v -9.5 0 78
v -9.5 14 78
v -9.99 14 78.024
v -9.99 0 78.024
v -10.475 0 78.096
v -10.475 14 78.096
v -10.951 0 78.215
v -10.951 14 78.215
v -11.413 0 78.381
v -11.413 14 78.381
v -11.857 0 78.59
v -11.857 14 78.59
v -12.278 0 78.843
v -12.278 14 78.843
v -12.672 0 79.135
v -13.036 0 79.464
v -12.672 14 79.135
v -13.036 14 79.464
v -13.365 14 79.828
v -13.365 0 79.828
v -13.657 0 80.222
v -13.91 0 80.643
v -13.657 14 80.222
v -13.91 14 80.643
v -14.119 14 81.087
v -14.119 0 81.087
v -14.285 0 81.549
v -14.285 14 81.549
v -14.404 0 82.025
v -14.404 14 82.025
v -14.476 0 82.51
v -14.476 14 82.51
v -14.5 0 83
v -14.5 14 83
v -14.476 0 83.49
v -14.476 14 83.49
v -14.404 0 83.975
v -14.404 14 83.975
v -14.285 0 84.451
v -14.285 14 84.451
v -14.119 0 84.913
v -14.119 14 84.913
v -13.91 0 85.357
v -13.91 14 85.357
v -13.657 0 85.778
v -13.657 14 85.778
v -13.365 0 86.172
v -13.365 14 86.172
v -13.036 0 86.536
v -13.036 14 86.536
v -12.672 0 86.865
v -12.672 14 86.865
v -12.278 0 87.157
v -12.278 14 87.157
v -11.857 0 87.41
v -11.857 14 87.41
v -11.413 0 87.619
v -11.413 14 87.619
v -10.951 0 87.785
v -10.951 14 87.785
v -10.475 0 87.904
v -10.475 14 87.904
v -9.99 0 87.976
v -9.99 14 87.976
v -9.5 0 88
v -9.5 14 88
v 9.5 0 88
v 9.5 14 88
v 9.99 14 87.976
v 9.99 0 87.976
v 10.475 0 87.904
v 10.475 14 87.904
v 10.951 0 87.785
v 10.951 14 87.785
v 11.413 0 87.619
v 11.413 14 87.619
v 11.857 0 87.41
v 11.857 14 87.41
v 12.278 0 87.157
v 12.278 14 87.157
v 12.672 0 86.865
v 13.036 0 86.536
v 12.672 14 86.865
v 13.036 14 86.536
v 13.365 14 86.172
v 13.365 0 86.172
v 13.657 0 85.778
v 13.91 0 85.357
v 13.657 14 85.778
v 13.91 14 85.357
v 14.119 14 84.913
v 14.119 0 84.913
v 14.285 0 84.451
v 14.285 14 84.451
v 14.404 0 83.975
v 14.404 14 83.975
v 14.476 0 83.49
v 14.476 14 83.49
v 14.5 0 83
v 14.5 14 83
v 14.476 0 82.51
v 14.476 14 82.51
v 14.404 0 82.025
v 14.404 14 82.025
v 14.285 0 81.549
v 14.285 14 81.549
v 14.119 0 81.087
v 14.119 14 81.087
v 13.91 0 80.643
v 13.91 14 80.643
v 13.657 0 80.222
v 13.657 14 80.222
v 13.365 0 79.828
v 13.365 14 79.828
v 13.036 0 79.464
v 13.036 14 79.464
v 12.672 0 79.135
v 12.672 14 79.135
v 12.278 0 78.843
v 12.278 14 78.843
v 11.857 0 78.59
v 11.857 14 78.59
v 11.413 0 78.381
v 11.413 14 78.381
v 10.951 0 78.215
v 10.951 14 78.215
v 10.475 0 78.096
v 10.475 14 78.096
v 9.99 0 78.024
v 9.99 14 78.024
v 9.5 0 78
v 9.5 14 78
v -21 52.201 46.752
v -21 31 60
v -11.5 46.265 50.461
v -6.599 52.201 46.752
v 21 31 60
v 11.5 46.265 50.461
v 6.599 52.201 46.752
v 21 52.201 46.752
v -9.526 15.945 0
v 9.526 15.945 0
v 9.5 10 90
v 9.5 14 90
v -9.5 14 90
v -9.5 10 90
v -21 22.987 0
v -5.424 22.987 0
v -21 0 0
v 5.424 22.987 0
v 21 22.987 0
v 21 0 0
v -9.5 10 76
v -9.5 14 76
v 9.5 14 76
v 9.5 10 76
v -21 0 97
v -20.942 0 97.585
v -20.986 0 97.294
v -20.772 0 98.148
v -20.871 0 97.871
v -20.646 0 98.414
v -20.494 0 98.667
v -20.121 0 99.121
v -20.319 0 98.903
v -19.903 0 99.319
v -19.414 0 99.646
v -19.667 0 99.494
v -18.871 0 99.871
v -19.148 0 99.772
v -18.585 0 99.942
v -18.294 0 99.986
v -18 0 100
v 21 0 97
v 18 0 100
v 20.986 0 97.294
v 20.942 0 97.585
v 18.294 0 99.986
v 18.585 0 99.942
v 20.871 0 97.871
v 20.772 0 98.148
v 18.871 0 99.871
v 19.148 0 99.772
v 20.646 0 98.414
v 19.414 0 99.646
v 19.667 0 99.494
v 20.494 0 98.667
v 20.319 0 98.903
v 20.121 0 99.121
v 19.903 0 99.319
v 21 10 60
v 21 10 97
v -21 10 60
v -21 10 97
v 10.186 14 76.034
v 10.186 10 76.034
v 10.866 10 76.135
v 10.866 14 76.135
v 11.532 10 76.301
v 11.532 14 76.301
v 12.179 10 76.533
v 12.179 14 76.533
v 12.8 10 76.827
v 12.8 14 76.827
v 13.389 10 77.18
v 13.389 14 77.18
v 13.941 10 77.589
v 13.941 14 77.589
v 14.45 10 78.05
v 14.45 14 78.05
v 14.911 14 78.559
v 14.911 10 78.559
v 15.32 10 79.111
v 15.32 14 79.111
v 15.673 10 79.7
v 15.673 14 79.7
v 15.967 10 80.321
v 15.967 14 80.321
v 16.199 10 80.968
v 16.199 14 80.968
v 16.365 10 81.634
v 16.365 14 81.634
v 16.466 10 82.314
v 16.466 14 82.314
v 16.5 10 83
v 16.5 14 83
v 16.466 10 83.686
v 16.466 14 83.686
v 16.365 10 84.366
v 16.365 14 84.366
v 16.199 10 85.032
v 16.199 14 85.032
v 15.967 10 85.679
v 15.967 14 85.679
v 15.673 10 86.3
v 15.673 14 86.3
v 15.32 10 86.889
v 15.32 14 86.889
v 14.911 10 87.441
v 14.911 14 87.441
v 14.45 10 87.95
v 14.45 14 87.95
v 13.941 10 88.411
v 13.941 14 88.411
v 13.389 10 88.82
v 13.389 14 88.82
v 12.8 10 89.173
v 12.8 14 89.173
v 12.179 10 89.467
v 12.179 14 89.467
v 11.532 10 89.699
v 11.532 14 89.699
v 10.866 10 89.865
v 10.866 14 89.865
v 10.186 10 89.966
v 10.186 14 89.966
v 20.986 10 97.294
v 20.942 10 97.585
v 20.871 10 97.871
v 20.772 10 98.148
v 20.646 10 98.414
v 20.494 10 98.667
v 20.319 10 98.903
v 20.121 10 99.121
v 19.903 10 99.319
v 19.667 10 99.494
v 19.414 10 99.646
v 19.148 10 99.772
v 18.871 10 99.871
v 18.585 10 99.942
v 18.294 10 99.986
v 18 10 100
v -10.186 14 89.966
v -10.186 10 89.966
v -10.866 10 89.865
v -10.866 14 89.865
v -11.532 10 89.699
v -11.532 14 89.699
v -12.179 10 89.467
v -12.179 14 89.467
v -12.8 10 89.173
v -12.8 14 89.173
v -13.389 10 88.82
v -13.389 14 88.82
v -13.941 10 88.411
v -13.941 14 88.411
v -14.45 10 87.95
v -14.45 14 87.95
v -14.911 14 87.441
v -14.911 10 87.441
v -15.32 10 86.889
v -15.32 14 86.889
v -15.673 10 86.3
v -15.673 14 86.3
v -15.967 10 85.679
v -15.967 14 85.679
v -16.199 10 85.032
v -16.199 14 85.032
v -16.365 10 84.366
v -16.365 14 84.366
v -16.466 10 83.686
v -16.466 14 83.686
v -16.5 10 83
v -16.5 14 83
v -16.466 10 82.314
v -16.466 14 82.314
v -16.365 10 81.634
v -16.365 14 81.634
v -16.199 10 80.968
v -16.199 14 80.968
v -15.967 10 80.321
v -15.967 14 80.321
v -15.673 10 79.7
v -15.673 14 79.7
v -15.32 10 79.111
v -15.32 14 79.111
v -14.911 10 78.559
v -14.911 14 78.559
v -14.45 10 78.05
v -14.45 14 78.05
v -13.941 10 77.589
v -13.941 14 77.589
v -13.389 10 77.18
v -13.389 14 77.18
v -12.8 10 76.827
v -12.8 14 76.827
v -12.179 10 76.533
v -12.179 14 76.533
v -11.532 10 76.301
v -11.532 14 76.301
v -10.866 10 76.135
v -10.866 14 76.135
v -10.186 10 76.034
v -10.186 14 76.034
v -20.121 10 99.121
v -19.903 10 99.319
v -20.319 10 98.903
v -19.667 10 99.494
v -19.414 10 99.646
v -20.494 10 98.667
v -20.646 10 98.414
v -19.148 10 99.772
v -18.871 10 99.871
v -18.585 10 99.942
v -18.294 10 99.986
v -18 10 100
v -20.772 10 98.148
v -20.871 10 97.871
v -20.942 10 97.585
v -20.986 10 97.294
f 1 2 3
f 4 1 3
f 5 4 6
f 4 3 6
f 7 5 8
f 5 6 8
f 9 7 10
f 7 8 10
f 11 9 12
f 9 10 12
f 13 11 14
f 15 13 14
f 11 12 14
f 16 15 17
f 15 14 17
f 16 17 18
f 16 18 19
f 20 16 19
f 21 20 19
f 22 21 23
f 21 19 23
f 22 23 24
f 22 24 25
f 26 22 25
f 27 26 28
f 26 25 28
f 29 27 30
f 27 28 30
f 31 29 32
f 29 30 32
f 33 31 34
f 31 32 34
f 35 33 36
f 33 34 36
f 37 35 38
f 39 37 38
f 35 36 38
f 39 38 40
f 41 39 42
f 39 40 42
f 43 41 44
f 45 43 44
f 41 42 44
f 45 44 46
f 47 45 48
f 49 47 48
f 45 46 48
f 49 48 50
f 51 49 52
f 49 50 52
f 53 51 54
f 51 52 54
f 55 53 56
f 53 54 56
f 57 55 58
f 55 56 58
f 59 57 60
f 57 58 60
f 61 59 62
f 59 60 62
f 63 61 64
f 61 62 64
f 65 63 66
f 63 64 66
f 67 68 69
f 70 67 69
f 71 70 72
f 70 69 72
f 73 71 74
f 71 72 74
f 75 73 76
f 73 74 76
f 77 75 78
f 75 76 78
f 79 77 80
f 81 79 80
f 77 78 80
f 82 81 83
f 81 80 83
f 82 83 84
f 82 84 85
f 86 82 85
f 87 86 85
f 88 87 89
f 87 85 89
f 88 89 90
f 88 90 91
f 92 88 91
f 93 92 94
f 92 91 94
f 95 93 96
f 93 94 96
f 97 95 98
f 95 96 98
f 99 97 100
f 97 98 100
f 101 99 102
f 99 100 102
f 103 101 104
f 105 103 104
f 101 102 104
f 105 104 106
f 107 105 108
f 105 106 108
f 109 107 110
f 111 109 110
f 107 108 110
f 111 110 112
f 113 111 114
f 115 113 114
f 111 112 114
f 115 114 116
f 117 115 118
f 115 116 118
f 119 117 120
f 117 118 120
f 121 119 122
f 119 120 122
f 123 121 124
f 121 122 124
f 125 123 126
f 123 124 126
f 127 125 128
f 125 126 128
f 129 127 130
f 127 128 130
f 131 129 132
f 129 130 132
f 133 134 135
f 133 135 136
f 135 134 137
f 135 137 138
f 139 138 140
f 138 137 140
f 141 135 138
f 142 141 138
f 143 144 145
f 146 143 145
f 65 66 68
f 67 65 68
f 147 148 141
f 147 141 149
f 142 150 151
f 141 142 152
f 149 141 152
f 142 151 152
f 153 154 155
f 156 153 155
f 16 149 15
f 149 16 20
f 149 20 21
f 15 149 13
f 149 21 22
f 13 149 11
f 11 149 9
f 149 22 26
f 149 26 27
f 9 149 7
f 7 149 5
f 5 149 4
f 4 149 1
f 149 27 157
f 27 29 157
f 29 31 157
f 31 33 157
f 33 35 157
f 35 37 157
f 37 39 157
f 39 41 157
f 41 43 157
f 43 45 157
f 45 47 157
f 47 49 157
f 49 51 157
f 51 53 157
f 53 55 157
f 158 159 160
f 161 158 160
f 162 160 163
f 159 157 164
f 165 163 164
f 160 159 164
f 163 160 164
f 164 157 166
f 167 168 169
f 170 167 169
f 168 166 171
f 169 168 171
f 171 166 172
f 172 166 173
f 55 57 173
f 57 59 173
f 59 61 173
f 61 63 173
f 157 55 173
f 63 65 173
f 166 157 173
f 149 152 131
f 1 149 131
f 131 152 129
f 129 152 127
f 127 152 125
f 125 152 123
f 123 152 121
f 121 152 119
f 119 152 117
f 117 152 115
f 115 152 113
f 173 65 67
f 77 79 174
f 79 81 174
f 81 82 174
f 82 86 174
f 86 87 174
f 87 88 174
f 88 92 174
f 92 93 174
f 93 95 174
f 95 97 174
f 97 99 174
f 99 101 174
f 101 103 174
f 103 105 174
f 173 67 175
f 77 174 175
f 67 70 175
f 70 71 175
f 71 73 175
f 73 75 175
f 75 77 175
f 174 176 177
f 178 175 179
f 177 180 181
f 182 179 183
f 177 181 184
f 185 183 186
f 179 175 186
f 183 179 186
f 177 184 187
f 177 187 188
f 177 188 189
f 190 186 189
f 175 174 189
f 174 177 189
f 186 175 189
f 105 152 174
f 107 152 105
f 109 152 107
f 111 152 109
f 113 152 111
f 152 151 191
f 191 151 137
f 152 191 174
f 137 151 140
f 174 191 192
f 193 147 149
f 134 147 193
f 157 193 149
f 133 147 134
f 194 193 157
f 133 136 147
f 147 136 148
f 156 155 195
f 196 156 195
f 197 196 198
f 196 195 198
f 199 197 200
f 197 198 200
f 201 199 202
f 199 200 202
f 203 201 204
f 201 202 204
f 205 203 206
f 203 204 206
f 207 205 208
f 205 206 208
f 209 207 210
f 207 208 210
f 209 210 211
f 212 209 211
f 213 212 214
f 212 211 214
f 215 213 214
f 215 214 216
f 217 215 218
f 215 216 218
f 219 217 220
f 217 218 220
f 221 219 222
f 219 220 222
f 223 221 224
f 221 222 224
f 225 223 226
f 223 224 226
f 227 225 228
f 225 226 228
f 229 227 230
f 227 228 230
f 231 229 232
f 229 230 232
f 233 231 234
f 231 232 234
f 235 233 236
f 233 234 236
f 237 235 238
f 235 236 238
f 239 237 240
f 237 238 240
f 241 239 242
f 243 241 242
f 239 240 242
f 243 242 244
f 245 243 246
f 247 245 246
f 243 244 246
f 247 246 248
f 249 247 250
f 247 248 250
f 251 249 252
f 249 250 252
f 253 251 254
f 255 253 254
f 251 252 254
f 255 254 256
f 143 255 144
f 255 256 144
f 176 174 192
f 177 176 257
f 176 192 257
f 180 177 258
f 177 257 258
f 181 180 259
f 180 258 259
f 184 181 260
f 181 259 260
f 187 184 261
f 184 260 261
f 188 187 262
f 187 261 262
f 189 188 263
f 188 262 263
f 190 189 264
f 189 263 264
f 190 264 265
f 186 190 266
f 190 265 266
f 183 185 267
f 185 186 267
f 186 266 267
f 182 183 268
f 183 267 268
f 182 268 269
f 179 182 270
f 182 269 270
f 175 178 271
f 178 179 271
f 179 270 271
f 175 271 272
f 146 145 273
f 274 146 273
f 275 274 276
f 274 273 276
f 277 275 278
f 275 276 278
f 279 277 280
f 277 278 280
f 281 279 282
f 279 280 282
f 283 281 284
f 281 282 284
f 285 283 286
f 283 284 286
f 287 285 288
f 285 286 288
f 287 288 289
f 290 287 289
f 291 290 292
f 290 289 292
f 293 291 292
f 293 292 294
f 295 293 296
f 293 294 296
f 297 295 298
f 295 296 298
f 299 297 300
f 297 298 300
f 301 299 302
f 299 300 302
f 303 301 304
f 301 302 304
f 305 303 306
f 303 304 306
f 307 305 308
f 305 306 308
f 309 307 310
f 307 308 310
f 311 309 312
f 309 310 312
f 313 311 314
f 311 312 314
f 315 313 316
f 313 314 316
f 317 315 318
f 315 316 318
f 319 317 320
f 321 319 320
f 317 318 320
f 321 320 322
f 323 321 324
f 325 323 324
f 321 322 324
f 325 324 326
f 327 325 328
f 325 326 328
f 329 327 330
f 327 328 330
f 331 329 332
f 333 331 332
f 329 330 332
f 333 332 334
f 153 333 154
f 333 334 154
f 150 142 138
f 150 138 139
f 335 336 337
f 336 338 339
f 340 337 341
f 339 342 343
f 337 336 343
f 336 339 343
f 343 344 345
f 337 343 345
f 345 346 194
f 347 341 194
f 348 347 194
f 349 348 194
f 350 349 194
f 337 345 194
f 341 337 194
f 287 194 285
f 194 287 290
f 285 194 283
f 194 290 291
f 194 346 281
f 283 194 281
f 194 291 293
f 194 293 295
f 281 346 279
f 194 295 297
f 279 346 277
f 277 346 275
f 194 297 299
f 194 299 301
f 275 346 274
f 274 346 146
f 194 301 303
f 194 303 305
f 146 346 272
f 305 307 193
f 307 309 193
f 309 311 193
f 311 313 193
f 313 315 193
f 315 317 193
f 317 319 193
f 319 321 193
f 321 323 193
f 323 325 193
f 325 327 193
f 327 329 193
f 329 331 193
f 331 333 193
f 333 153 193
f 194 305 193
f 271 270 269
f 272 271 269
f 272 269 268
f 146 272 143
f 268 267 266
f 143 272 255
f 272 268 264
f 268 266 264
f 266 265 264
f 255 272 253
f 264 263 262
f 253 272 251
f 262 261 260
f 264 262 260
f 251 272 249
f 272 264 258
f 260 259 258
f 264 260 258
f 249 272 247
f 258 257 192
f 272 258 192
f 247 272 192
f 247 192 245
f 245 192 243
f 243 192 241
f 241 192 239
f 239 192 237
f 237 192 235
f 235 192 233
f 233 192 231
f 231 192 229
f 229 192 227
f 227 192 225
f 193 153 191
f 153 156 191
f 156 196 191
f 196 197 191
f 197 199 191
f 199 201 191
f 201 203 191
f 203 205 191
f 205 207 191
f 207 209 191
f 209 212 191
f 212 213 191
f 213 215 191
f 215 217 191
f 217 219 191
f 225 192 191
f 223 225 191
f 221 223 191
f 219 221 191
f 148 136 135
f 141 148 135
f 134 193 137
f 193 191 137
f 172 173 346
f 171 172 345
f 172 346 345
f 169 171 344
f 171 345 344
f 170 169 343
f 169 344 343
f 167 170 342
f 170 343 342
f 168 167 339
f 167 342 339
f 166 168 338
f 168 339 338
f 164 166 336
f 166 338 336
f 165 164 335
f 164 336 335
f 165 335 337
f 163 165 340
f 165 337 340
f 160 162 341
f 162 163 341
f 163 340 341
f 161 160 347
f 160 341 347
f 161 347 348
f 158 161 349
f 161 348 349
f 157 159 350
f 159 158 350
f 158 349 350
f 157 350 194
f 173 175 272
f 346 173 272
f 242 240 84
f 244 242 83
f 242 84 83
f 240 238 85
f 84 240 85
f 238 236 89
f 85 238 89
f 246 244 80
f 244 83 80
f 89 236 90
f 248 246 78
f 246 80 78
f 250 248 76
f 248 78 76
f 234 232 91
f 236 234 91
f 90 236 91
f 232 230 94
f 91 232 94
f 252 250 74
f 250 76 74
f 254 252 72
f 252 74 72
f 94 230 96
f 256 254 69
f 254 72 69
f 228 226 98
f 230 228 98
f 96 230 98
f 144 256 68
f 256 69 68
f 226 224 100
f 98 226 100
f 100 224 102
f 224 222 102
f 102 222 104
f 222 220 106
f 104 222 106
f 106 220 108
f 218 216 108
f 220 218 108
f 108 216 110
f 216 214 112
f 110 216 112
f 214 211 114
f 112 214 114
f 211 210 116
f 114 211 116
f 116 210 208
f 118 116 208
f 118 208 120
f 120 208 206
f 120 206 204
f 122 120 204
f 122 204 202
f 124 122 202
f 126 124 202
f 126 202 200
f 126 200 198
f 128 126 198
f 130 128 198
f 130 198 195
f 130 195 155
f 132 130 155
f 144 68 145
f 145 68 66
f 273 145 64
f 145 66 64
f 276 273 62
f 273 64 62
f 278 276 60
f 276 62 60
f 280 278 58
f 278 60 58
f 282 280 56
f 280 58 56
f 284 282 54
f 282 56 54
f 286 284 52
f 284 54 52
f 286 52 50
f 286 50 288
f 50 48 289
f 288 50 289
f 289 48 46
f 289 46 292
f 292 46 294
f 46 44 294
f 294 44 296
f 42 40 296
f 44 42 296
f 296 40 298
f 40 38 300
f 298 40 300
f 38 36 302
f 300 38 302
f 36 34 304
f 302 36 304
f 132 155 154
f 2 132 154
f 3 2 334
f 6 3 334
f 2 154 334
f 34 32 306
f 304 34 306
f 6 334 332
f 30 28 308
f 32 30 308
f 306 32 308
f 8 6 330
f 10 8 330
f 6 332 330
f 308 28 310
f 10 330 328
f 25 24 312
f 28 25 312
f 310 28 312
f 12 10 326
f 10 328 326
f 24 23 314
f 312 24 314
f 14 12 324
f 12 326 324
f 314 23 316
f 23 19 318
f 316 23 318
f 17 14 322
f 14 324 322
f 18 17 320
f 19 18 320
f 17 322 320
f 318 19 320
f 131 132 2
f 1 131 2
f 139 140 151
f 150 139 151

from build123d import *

# Parameters (mm, degrees)
BOSS_EXTRUDE1_DEPTH = 21
CUT_EXTRUDE1_DEPTH  = 60
CUT_EXTRUDE1_DRAFT  = -1
CUT_EXTRUDE2_REACH  = 112.553
BOSS_EXTRUDE2_START = 4
BOSS_EXTRUDE2_DEPTH = 4


with BuildPart() as part:
    # Sketch1 → Boss-Extrude1 (new, symmetric)
    with BuildSketch(Plane(origin=(0, 0, 0), x_dir=(0, 0, -1), z_dir=(1, 0, 0))):
        Polygon((0, 0), (-100, 0), (-100, 10), (-60, 10), (-60, 31), (-46.752018394, 52.201202404), (0, 22.987298969), align=None)
    extrude(amount=BOSS_EXTRUDE1_DEPTH, both=True)


with BuildPart() as cut_extrude1_tool:
    # Sketch2 → Cut-Extrude1 (with draft: the straight prism first)
    with BuildSketch(Plane(origin=(0, 35.669068614, 57.082442121), x_dir=(1, 0, 0), z_dir=(0, 0.5299192642331993, 0.8480480961564296))):
        Polygon((5.821903288, 20.603497628), (-5.821903288, 20.603497628), (-11.5, 12.494335127), (11.5, 12.494335127), align=None)
    extrude(amount=-CUT_EXTRUDE1_DEPTH)
    # Cut-Extrude1: the draft: its side faces are tilted about the plane it starts from
    cut_extrude1_sides = [cut_extrude1_tool.faces().sort_by_distance(p)[0] for p in [
        (0, 30.367287804, 25.020010359),
        (8.660951644, 33.805767714, 22.871409646),
        (0, 37.244247624, 20.722808933),
        (-8.660951644, 33.805767714, 22.871409646),
    ]]
    draft(cut_extrude1_sides, Plane(origin=(0, 35.669068614, 57.082442121), x_dir=(1, 0, 0), z_dir=(0, 0.5299192642331993, 0.8480480961564296)), CUT_EXTRUDE1_DRAFT)


with BuildPart() as part_1:
    add(part.part)

    # Cut-Extrude1: cut by cut_extrude1_tool
    add(cut_extrude1_tool.part, mode=Mode.SUBTRACT)

    # Sketch3 → Cut-Extrude2 (cut, up to next)
    with BuildSketch(Plane(origin=(0, 10, 0), x_dir=(1, 0, 0), z_dir=(0, 1, 0)), mode=Mode.PRIVATE) as cut_extrude2_sk1:
        with BuildLine():
            Line((9.5, -78), (-9.5, -78))
            ThreePointArc((-9.5, -78), (-14.5, -83), (-9.5, -88))
            Line((-9.5, -88), (9.5, -88))
            ThreePointArc((9.5, -88), (14.5, -83), (9.5, -78))
        make_face()
    cut_extrude2_tool1 = extrude(cut_extrude2_sk1.sketch, amount=-CUT_EXTRUDE2_REACH, mode=Mode.PRIVATE) & part_1.part
    # Sketch3 → Cut-Extrude2 (cut, up to next)
    with BuildSketch(Plane(origin=(0, 10, 0), x_dir=(1, 0, 0), z_dir=(0, 1, 0)), mode=Mode.PRIVATE) as cut_extrude2_sk2:
        with BuildLine():
            ThreePointArc((21, -97), (20.121320344, -99.121320344), (18, -100))
            Line((18, -100), (21, -100))
            Line((21, -100), (21, -97))
        make_face()
    cut_extrude2_tool2 = extrude(cut_extrude2_sk2.sketch, amount=-CUT_EXTRUDE2_REACH, mode=Mode.PRIVATE) & part_1.part
    # Sketch3 → Cut-Extrude2 (cut, up to next)
    with BuildSketch(Plane(origin=(0, 10, 0), x_dir=(1, 0, 0), z_dir=(0, 1, 0)), mode=Mode.PRIVATE) as cut_extrude2_sk3:
        with BuildLine():
            ThreePointArc((-18, -100), (-20.121320344, -99.121320344), (-21, -97))
            Line((-21, -97), (-21, -100))
            Line((-21, -100), (-18, -100))
        make_face()
    cut_extrude2_tool3 = extrude(cut_extrude2_sk3.sketch, amount=-CUT_EXTRUDE2_REACH, mode=Mode.PRIVATE) & part_1.part
    add(cut_extrude2_tool1.solids().sort_by_distance((0, 10, 83))[0], mode=Mode.SUBTRACT)
    add(cut_extrude2_tool2.solids().sort_by_distance((20.329896, 10, 99.329896))[0], mode=Mode.SUBTRACT)
    add(cut_extrude2_tool3.solids().sort_by_distance((-20.329896, 10, 99.329896))[0], mode=Mode.SUBTRACT)

    # Sketch3<3> → Boss-Extrude2 (add)
    with BuildSketch(Plane(origin=(0, 10, 0), x_dir=(1, 0, 0), z_dir=(0, 1, 0)).offset(BOSS_EXTRUDE2_START)):
        with BuildLine():
            Line((9.5, -76), (-9.5, -76))
            ThreePointArc((-9.5, -76), (-16.5, -83), (-9.5, -90))
            Line((-9.5, -90), (9.5, -90))
            ThreePointArc((9.5, -90), (16.5, -83), (9.5, -76))
        make_face()
        with BuildLine():
            ThreePointArc((-9.5, -88), (-14.5, -83), (-9.5, -78))
            Line((-9.5, -78), (9.5, -78))
            ThreePointArc((9.5, -78), (14.5, -83), (9.5, -88))
            Line((9.5, -88), (-9.5, -88))
        make_face(mode=Mode.SUBTRACT)
    extrude(amount=-BOSS_EXTRUDE2_DEPTH)


solid = part_1.part
